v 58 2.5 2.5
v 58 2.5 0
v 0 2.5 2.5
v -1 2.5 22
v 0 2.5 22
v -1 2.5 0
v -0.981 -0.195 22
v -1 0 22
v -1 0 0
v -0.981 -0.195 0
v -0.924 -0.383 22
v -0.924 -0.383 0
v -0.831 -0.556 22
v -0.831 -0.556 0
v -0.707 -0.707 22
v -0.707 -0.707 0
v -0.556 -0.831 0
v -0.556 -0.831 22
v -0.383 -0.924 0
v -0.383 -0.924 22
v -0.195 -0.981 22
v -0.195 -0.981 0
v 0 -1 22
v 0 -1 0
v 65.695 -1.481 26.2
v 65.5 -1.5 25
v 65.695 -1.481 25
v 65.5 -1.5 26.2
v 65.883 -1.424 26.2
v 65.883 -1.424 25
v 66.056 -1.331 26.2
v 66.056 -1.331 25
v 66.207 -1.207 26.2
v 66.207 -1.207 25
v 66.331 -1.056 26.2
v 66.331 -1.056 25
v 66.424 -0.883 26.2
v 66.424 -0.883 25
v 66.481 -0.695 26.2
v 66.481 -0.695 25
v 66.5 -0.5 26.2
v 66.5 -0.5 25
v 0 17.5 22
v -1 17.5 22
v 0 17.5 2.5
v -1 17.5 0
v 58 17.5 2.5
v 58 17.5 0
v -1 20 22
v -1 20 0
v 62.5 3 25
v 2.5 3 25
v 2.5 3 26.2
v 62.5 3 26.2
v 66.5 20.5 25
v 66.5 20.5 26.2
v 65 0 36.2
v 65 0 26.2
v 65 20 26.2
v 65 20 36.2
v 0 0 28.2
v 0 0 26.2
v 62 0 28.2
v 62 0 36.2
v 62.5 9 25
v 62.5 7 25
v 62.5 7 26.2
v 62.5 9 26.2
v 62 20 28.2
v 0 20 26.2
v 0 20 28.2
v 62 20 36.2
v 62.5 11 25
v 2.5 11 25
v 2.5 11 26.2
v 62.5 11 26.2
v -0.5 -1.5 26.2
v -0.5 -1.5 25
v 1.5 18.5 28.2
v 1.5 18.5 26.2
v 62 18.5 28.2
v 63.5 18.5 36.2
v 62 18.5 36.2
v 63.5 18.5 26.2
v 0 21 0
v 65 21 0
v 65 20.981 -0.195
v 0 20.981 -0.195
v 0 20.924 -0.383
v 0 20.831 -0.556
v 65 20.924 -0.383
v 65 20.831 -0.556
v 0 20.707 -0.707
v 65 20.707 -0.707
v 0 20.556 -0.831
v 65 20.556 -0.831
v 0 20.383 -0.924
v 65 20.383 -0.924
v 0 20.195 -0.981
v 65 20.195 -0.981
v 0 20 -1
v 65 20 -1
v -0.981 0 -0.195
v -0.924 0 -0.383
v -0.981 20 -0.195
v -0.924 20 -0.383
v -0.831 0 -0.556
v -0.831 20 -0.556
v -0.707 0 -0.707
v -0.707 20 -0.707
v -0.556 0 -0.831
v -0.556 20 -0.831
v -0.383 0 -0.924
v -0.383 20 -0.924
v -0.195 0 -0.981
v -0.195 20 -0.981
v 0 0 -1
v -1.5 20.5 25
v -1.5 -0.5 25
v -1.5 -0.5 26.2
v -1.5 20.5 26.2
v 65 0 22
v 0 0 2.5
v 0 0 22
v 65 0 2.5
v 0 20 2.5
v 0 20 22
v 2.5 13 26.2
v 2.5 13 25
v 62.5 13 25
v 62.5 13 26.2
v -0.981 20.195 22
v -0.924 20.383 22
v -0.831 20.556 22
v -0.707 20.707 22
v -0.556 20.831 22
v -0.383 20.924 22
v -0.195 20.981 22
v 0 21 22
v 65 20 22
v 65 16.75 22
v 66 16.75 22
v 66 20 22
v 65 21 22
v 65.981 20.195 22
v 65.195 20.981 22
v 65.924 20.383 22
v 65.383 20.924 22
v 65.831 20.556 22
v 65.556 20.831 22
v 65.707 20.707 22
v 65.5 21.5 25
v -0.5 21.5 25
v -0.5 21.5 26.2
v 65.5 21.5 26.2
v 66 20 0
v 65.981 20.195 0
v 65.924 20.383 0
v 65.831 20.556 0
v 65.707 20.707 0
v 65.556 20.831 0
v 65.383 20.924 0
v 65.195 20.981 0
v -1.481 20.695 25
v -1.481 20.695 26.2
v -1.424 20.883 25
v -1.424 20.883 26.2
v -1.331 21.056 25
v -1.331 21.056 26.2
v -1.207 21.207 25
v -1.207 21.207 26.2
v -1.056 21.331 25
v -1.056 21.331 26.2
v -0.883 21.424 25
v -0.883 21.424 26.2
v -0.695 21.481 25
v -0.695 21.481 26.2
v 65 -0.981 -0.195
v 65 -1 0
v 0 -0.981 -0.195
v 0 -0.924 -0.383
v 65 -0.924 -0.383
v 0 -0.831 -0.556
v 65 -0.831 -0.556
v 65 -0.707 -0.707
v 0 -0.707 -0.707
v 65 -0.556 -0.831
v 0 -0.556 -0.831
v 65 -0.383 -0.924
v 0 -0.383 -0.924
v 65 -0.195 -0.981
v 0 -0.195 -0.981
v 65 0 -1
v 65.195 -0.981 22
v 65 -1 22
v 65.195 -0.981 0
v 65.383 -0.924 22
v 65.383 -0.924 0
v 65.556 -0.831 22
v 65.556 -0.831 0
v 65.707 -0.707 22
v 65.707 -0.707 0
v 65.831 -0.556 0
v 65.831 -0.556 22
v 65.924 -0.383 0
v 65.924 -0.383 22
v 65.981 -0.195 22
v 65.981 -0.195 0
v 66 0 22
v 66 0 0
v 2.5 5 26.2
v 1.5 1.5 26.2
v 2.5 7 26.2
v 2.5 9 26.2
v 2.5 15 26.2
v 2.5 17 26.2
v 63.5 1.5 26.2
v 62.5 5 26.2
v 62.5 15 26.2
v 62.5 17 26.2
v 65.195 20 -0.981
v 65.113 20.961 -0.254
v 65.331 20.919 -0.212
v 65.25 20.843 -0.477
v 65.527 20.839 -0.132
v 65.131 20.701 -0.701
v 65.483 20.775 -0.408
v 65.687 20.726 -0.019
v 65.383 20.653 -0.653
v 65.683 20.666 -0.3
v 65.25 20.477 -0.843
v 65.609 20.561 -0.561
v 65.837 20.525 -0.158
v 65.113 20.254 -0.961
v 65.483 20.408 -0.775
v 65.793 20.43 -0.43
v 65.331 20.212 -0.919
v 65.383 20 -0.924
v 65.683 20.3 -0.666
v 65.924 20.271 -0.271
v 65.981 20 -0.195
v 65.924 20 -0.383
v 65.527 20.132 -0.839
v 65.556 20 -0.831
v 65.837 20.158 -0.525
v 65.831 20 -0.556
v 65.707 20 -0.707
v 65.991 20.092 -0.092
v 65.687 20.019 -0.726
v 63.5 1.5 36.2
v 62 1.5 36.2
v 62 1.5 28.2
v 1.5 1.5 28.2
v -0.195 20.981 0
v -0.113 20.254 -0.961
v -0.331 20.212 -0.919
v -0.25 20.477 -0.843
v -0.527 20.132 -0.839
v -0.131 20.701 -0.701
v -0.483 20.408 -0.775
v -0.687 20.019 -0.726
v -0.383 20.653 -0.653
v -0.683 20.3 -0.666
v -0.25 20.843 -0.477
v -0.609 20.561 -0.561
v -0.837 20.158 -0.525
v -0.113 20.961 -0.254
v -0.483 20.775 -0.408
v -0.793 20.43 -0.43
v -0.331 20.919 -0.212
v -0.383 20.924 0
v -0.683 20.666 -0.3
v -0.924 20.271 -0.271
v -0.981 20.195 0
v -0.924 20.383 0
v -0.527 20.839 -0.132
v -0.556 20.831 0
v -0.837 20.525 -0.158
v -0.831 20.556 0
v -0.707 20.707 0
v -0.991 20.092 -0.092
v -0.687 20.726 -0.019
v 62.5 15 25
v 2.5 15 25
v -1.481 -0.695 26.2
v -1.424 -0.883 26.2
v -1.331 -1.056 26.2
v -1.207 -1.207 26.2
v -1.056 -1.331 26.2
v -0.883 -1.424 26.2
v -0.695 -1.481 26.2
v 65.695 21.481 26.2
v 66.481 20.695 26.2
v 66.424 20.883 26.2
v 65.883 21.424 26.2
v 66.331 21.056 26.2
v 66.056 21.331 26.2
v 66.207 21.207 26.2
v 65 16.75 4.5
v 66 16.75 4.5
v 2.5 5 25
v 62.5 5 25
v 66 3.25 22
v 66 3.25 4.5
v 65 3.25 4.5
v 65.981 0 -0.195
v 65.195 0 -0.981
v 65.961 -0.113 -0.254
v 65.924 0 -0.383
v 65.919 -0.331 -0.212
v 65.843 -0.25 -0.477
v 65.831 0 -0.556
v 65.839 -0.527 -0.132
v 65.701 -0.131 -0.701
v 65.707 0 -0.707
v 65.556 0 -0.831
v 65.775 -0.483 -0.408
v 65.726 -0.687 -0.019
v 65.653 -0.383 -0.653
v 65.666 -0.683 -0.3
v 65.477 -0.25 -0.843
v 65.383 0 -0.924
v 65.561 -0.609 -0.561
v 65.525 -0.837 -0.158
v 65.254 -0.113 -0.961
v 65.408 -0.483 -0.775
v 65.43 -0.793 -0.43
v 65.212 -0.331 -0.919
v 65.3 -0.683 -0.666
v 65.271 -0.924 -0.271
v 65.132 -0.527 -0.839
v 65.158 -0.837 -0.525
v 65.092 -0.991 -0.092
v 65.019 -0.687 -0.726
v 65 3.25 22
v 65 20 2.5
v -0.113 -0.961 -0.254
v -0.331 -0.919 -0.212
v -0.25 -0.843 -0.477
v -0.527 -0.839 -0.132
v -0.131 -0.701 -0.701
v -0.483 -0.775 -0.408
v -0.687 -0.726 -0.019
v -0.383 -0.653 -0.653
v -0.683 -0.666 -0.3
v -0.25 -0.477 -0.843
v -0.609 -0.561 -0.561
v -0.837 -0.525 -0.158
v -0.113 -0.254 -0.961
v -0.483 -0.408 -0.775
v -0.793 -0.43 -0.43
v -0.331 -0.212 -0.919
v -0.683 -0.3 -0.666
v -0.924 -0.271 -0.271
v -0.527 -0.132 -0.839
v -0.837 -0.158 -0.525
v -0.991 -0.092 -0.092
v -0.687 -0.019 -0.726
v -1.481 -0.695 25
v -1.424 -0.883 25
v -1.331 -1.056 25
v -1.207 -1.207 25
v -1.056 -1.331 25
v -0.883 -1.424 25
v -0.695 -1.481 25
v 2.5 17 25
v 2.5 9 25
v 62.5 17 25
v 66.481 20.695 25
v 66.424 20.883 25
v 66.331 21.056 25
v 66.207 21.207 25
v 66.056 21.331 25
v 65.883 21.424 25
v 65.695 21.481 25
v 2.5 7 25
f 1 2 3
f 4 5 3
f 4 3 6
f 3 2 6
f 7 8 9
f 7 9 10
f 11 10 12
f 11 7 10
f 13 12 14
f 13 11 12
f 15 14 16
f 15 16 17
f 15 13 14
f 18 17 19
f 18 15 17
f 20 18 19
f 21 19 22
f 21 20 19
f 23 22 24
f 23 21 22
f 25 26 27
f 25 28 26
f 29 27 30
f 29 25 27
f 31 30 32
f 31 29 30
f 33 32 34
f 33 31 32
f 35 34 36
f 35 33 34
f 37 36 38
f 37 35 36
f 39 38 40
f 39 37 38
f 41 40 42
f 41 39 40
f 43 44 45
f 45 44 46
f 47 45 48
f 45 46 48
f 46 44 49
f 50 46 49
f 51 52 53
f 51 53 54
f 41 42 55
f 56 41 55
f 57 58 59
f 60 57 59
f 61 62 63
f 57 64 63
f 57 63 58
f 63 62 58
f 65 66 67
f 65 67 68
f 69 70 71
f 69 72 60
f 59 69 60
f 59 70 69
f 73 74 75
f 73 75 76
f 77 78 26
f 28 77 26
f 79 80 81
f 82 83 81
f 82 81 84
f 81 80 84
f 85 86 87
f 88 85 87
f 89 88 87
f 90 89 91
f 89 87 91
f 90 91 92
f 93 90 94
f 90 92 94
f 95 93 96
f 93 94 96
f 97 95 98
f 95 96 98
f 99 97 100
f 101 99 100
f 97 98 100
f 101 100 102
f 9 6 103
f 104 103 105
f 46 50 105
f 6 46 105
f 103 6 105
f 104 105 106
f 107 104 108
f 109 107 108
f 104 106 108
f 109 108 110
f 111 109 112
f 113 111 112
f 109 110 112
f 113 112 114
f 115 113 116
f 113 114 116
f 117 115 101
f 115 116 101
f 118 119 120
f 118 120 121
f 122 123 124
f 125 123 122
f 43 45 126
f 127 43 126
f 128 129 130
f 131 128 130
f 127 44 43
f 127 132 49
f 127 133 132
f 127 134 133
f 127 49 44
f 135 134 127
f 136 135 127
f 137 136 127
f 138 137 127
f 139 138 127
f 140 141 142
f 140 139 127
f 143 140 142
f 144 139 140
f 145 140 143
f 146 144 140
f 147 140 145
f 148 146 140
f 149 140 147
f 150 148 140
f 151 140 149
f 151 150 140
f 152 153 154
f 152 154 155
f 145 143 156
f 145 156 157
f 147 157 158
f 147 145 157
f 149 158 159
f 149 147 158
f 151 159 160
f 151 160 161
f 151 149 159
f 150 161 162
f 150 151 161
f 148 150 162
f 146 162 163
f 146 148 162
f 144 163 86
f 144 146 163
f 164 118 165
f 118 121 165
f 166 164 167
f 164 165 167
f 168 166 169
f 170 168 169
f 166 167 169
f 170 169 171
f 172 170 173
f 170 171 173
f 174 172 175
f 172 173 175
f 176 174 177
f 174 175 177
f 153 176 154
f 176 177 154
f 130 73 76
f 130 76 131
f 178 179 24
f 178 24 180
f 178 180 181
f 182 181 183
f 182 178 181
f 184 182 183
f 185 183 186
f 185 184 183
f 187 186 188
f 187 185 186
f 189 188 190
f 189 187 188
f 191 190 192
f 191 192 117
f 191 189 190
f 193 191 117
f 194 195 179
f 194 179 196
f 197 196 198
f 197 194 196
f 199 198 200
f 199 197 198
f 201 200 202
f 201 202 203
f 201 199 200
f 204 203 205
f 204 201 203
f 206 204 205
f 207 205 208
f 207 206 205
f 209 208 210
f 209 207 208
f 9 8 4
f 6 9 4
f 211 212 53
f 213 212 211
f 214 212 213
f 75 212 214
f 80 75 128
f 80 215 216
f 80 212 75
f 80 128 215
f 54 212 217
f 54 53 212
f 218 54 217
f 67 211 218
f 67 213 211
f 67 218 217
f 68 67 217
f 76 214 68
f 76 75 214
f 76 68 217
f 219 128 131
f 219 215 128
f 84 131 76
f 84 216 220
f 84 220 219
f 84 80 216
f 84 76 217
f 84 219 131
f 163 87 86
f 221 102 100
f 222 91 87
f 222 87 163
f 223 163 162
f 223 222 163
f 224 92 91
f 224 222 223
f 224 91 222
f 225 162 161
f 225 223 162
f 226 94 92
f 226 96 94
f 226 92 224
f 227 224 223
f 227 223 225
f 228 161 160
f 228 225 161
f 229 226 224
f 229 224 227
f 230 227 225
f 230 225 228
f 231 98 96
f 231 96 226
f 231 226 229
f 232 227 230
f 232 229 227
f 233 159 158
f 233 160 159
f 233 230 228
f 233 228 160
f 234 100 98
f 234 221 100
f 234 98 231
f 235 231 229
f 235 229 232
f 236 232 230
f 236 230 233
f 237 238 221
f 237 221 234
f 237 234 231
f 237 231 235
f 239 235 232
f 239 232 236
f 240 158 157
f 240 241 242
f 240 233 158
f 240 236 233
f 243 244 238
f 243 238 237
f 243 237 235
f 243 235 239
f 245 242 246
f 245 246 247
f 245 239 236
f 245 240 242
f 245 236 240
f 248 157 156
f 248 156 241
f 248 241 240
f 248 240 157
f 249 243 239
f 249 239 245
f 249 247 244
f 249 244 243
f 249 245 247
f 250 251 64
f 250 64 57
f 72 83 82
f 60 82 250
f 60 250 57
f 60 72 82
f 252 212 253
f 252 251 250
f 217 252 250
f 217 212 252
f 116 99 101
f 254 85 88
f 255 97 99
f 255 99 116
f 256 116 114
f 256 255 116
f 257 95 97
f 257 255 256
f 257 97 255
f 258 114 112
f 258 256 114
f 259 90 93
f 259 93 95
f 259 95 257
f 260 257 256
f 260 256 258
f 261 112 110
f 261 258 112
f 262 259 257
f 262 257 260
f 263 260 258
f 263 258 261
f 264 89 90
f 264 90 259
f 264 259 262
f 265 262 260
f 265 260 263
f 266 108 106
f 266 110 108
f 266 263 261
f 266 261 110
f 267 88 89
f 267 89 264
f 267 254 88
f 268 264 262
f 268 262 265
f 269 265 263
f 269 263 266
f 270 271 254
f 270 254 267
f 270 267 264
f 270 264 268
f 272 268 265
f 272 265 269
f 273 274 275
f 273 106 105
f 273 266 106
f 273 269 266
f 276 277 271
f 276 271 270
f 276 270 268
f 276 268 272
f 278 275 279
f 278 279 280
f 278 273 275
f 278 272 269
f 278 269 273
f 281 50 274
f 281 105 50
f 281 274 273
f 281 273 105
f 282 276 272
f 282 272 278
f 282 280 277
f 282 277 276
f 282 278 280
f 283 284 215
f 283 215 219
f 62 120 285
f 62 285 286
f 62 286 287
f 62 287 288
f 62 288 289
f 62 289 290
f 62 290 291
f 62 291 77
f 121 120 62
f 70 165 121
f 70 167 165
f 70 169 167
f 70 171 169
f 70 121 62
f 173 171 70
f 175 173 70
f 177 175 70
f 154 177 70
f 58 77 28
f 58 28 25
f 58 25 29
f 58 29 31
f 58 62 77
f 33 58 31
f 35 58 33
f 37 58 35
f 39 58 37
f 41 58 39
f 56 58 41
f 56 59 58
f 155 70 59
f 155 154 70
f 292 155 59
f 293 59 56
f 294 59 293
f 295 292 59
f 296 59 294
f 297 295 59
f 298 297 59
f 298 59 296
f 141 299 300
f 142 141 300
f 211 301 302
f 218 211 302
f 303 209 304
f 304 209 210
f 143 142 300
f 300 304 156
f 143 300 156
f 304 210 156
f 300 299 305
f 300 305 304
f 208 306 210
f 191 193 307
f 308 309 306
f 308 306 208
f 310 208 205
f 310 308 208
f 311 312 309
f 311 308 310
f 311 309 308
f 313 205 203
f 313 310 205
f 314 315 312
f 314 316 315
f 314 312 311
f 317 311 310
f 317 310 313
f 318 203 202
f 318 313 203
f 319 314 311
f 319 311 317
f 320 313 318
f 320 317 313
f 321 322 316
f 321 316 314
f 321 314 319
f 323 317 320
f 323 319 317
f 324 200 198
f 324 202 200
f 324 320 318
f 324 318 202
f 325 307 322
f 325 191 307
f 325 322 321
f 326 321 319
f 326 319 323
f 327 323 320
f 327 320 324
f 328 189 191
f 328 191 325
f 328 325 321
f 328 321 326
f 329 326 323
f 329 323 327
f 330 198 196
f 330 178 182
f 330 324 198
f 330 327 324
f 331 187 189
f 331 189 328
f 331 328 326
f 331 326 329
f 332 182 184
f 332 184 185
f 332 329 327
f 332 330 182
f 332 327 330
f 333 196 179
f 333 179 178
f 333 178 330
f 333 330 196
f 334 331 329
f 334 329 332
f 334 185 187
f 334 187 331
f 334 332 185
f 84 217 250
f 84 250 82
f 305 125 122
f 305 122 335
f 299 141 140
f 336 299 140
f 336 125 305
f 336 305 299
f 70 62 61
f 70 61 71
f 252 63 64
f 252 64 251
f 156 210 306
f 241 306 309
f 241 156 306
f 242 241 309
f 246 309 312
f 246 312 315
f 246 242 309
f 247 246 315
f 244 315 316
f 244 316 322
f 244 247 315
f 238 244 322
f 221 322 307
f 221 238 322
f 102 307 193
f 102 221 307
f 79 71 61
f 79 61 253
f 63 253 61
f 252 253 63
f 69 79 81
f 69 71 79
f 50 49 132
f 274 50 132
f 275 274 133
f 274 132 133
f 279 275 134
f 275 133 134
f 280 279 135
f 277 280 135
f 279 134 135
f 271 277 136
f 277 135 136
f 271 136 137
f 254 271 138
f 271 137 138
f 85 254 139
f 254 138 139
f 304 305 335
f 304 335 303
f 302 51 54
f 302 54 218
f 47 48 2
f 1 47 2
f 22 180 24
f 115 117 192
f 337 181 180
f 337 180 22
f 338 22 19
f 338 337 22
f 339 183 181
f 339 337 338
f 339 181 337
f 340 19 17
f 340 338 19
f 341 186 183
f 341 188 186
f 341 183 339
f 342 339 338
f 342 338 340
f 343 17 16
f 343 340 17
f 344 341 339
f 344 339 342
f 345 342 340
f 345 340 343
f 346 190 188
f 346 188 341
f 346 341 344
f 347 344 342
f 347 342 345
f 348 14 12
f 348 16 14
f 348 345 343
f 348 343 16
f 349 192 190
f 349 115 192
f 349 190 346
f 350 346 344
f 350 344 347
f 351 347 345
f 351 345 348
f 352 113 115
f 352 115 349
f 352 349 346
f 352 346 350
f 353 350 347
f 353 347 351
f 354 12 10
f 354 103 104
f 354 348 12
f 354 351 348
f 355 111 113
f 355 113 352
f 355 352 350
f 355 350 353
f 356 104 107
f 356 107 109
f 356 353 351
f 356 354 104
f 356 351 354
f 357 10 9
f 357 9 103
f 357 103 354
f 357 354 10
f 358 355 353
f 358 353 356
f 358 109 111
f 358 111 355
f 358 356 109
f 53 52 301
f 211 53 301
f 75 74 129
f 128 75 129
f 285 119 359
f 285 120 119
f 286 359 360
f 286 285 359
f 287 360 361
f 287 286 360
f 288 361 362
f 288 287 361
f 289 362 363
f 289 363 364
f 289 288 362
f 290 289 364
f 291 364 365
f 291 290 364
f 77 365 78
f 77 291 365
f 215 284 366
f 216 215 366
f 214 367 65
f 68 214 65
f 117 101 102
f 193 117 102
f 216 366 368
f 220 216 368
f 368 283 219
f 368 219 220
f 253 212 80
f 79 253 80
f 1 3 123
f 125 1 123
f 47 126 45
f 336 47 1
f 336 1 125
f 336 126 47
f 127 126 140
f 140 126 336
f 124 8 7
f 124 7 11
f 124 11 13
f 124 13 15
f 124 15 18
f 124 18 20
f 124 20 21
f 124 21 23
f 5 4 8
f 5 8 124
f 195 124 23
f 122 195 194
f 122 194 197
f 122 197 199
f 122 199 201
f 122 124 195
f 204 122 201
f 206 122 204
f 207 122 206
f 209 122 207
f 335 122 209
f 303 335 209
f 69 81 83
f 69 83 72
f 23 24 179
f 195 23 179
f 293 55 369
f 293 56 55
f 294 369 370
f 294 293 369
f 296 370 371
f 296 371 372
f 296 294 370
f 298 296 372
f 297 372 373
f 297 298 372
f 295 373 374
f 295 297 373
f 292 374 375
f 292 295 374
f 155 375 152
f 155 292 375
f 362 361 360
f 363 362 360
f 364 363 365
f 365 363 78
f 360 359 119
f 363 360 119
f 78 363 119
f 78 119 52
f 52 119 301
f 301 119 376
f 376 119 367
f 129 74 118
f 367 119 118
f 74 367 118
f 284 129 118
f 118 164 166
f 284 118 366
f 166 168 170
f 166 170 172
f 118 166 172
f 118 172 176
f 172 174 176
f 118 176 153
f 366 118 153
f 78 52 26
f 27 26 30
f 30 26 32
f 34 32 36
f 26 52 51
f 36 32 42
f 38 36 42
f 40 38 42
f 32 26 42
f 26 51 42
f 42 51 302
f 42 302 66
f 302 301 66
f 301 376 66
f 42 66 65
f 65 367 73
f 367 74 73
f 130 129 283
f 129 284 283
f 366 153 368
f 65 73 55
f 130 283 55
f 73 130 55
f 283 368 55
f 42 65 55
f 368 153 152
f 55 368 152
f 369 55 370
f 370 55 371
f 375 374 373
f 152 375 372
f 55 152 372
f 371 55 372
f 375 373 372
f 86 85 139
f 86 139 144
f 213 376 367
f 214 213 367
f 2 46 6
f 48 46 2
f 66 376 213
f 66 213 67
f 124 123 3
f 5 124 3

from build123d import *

# Parameters (mm, degrees)
BOX001_W      = 10
BOX001_H      = 15
BOX001_DEPTH  = 25
BOX002_W      = 10
BOX002_H      = 13.5
BOX002_DEPTH  = 24.5
BOX_W         = 65
BOX_H         = 20
BOX_DEPTH     = 22
THICKNESS_T   = 1
PAD_DEPTH     = 2.5
BOX006_W      = 60
BOX006_H      = 2
BOX006_DEPTH  = 5
ARRAY_Y_COUNT = 4
ARRAY_Y_PITCH = 4
BOX003_W      = 68
BOX003_H      = 23
BOX003_DEPTH  = 1.2
FILLET_R      = 1
BOX009_W      = 62
BOX009_H      = 20
BOX009_DEPTH  = 8
BOX005_W      = 62
BOX005_H      = 17
BOX005_DEPTH  = 12
BOX004_W      = 65
BOX004_H      = 20
BOX004_DEPTH  = 10


with BuildPart() as cable_hole:
    # Box001 → Box001 (new body)
    with BuildSketch(Plane(origin=(-5, 2.5, 0), x_dir=(1, 0, 0), z_dir=(0, 0, 1))):
        with Locations((5, 7.5)):
            Rectangle(BOX001_W, BOX001_H)
    extrude(amount=BOX001_DEPTH)


with BuildPart() as usb_hole:
    # Box002 → Box002 (new body)
    with BuildSketch(Plane(origin=(60, 3.25, 4.5), x_dir=(1, 0, 0), z_dir=(0, 0, 1))):
        with Locations((5, 6.75)):
            Rectangle(BOX002_W, BOX002_H)
    extrude(amount=BOX002_DEPTH)


with BuildPart() as caja:
    # Box → Box (new body)
    with BuildSketch(Plane.XY):
        with Locations((32.5, 10)):
            Rectangle(BOX_W, BOX_H)
    extrude(amount=BOX_DEPTH)

    # Thickness
    thickness_openings = [caja.faces().sort_by_distance(p)[0] for p in [
        (32.5, 10, 22),
    ]]
    offset(amount=THICKNESS_T, openings=thickness_openings)

    # Sketch (on Face5 of BaseFeature) → Pad (new body)
    with BuildSketch(Plane.XY):
        Polygon((65, 20), (0, 20), (0, 17.5), (58, 17.5), (58, 2.5), (0, 2.5), (0, 0), (65, 0), align=None)
    extrude(amount=PAD_DEPTH)

    # Cut: cut usb_hole
    add(usb_hole.part, mode=Mode.SUBTRACT)

    # Cut004: cut cable_hole
    add(cable_hole.part, mode=Mode.SUBTRACT)


with BuildPart() as array:
    # Box006 → Box006 (new body)
    with BuildSketch(Plane(origin=(2.5, 3, 24), x_dir=(1, 0, 0), z_dir=(0, 0, 1))):
        with Locations((30, 1)):
            Rectangle(BOX006_W, BOX006_H)
    extrude(amount=BOX006_DEPTH)

    # Array Y: Array ×4


with BuildPart() as array_1:
    add(array.part)
    with Locations(*[(0, i * ARRAY_Y_PITCH, 0) for i in range(1, ARRAY_Y_COUNT)]):
        add(array.part)


with BuildPart() as fillet_body:
    # Box003 → Box003 (new body)
    with BuildSketch(Plane(origin=(-1.5, -1.5, 25), x_dir=(1, 0, 0), z_dir=(0, 0, 1))):
        with Locations((34, 11.5)):
            Rectangle(BOX003_W, BOX003_H)
    extrude(amount=BOX003_DEPTH)

    # Fillet
    fillet_edges = [fillet_body.edges().sort_by_distance(p)[0] for p in [
        (-1.5, -1.5, 25.6),
        (-1.5, 21.5, 25.6),
        (66.5, -1.5, 25.6),
        (66.5, 21.5, 25.6),
    ]]
    fillet(fillet_edges, radius=FILLET_R)


with BuildPart() as cubo007:
    # Box009 → Box009 (new body)
    with BuildSketch(Plane.XY.offset(29)):
        with Locations((31, 10)):
            Rectangle(BOX009_W, BOX009_H)
    extrude(amount=BOX009_DEPTH)


with BuildPart() as cubo003:
    # Box005 → Box005 (new body)
    with BuildSketch(Plane(origin=(1.5, 1.5, 27), x_dir=(1, 0, 0), z_dir=(0, 0, 1))):
        with Locations((31, 8.5)):
            Rectangle(BOX005_W, BOX005_H)
    extrude(amount=BOX005_DEPTH)


with BuildPart() as tapa:
    # Box004 → Box004 (new body)
    with BuildSketch(Plane.XY.offset(27)):
        with Locations((32.5, 10)):
            Rectangle(BOX004_W, BOX004_H)
    extrude(amount=BOX004_DEPTH)

    # Cut005: cut Cubo003
    add(cubo003.part, mode=Mode.SUBTRACT)

    # Cut006: cut Cubo007
    add(cubo007.part, mode=Mode.SUBTRACT)


with BuildPart() as tapa_1:
    # Cut006 placement: moved
    add(tapa.part.moved(Location((0, 0, -0.8))))

    # Fusion: union Fillet body
    add(fillet_body.part)

    # Cut007: cut Array
    add(array_1.part, mode=Mode.SUBTRACT)


solid = Compound([caja.part, tapa_1.part])
